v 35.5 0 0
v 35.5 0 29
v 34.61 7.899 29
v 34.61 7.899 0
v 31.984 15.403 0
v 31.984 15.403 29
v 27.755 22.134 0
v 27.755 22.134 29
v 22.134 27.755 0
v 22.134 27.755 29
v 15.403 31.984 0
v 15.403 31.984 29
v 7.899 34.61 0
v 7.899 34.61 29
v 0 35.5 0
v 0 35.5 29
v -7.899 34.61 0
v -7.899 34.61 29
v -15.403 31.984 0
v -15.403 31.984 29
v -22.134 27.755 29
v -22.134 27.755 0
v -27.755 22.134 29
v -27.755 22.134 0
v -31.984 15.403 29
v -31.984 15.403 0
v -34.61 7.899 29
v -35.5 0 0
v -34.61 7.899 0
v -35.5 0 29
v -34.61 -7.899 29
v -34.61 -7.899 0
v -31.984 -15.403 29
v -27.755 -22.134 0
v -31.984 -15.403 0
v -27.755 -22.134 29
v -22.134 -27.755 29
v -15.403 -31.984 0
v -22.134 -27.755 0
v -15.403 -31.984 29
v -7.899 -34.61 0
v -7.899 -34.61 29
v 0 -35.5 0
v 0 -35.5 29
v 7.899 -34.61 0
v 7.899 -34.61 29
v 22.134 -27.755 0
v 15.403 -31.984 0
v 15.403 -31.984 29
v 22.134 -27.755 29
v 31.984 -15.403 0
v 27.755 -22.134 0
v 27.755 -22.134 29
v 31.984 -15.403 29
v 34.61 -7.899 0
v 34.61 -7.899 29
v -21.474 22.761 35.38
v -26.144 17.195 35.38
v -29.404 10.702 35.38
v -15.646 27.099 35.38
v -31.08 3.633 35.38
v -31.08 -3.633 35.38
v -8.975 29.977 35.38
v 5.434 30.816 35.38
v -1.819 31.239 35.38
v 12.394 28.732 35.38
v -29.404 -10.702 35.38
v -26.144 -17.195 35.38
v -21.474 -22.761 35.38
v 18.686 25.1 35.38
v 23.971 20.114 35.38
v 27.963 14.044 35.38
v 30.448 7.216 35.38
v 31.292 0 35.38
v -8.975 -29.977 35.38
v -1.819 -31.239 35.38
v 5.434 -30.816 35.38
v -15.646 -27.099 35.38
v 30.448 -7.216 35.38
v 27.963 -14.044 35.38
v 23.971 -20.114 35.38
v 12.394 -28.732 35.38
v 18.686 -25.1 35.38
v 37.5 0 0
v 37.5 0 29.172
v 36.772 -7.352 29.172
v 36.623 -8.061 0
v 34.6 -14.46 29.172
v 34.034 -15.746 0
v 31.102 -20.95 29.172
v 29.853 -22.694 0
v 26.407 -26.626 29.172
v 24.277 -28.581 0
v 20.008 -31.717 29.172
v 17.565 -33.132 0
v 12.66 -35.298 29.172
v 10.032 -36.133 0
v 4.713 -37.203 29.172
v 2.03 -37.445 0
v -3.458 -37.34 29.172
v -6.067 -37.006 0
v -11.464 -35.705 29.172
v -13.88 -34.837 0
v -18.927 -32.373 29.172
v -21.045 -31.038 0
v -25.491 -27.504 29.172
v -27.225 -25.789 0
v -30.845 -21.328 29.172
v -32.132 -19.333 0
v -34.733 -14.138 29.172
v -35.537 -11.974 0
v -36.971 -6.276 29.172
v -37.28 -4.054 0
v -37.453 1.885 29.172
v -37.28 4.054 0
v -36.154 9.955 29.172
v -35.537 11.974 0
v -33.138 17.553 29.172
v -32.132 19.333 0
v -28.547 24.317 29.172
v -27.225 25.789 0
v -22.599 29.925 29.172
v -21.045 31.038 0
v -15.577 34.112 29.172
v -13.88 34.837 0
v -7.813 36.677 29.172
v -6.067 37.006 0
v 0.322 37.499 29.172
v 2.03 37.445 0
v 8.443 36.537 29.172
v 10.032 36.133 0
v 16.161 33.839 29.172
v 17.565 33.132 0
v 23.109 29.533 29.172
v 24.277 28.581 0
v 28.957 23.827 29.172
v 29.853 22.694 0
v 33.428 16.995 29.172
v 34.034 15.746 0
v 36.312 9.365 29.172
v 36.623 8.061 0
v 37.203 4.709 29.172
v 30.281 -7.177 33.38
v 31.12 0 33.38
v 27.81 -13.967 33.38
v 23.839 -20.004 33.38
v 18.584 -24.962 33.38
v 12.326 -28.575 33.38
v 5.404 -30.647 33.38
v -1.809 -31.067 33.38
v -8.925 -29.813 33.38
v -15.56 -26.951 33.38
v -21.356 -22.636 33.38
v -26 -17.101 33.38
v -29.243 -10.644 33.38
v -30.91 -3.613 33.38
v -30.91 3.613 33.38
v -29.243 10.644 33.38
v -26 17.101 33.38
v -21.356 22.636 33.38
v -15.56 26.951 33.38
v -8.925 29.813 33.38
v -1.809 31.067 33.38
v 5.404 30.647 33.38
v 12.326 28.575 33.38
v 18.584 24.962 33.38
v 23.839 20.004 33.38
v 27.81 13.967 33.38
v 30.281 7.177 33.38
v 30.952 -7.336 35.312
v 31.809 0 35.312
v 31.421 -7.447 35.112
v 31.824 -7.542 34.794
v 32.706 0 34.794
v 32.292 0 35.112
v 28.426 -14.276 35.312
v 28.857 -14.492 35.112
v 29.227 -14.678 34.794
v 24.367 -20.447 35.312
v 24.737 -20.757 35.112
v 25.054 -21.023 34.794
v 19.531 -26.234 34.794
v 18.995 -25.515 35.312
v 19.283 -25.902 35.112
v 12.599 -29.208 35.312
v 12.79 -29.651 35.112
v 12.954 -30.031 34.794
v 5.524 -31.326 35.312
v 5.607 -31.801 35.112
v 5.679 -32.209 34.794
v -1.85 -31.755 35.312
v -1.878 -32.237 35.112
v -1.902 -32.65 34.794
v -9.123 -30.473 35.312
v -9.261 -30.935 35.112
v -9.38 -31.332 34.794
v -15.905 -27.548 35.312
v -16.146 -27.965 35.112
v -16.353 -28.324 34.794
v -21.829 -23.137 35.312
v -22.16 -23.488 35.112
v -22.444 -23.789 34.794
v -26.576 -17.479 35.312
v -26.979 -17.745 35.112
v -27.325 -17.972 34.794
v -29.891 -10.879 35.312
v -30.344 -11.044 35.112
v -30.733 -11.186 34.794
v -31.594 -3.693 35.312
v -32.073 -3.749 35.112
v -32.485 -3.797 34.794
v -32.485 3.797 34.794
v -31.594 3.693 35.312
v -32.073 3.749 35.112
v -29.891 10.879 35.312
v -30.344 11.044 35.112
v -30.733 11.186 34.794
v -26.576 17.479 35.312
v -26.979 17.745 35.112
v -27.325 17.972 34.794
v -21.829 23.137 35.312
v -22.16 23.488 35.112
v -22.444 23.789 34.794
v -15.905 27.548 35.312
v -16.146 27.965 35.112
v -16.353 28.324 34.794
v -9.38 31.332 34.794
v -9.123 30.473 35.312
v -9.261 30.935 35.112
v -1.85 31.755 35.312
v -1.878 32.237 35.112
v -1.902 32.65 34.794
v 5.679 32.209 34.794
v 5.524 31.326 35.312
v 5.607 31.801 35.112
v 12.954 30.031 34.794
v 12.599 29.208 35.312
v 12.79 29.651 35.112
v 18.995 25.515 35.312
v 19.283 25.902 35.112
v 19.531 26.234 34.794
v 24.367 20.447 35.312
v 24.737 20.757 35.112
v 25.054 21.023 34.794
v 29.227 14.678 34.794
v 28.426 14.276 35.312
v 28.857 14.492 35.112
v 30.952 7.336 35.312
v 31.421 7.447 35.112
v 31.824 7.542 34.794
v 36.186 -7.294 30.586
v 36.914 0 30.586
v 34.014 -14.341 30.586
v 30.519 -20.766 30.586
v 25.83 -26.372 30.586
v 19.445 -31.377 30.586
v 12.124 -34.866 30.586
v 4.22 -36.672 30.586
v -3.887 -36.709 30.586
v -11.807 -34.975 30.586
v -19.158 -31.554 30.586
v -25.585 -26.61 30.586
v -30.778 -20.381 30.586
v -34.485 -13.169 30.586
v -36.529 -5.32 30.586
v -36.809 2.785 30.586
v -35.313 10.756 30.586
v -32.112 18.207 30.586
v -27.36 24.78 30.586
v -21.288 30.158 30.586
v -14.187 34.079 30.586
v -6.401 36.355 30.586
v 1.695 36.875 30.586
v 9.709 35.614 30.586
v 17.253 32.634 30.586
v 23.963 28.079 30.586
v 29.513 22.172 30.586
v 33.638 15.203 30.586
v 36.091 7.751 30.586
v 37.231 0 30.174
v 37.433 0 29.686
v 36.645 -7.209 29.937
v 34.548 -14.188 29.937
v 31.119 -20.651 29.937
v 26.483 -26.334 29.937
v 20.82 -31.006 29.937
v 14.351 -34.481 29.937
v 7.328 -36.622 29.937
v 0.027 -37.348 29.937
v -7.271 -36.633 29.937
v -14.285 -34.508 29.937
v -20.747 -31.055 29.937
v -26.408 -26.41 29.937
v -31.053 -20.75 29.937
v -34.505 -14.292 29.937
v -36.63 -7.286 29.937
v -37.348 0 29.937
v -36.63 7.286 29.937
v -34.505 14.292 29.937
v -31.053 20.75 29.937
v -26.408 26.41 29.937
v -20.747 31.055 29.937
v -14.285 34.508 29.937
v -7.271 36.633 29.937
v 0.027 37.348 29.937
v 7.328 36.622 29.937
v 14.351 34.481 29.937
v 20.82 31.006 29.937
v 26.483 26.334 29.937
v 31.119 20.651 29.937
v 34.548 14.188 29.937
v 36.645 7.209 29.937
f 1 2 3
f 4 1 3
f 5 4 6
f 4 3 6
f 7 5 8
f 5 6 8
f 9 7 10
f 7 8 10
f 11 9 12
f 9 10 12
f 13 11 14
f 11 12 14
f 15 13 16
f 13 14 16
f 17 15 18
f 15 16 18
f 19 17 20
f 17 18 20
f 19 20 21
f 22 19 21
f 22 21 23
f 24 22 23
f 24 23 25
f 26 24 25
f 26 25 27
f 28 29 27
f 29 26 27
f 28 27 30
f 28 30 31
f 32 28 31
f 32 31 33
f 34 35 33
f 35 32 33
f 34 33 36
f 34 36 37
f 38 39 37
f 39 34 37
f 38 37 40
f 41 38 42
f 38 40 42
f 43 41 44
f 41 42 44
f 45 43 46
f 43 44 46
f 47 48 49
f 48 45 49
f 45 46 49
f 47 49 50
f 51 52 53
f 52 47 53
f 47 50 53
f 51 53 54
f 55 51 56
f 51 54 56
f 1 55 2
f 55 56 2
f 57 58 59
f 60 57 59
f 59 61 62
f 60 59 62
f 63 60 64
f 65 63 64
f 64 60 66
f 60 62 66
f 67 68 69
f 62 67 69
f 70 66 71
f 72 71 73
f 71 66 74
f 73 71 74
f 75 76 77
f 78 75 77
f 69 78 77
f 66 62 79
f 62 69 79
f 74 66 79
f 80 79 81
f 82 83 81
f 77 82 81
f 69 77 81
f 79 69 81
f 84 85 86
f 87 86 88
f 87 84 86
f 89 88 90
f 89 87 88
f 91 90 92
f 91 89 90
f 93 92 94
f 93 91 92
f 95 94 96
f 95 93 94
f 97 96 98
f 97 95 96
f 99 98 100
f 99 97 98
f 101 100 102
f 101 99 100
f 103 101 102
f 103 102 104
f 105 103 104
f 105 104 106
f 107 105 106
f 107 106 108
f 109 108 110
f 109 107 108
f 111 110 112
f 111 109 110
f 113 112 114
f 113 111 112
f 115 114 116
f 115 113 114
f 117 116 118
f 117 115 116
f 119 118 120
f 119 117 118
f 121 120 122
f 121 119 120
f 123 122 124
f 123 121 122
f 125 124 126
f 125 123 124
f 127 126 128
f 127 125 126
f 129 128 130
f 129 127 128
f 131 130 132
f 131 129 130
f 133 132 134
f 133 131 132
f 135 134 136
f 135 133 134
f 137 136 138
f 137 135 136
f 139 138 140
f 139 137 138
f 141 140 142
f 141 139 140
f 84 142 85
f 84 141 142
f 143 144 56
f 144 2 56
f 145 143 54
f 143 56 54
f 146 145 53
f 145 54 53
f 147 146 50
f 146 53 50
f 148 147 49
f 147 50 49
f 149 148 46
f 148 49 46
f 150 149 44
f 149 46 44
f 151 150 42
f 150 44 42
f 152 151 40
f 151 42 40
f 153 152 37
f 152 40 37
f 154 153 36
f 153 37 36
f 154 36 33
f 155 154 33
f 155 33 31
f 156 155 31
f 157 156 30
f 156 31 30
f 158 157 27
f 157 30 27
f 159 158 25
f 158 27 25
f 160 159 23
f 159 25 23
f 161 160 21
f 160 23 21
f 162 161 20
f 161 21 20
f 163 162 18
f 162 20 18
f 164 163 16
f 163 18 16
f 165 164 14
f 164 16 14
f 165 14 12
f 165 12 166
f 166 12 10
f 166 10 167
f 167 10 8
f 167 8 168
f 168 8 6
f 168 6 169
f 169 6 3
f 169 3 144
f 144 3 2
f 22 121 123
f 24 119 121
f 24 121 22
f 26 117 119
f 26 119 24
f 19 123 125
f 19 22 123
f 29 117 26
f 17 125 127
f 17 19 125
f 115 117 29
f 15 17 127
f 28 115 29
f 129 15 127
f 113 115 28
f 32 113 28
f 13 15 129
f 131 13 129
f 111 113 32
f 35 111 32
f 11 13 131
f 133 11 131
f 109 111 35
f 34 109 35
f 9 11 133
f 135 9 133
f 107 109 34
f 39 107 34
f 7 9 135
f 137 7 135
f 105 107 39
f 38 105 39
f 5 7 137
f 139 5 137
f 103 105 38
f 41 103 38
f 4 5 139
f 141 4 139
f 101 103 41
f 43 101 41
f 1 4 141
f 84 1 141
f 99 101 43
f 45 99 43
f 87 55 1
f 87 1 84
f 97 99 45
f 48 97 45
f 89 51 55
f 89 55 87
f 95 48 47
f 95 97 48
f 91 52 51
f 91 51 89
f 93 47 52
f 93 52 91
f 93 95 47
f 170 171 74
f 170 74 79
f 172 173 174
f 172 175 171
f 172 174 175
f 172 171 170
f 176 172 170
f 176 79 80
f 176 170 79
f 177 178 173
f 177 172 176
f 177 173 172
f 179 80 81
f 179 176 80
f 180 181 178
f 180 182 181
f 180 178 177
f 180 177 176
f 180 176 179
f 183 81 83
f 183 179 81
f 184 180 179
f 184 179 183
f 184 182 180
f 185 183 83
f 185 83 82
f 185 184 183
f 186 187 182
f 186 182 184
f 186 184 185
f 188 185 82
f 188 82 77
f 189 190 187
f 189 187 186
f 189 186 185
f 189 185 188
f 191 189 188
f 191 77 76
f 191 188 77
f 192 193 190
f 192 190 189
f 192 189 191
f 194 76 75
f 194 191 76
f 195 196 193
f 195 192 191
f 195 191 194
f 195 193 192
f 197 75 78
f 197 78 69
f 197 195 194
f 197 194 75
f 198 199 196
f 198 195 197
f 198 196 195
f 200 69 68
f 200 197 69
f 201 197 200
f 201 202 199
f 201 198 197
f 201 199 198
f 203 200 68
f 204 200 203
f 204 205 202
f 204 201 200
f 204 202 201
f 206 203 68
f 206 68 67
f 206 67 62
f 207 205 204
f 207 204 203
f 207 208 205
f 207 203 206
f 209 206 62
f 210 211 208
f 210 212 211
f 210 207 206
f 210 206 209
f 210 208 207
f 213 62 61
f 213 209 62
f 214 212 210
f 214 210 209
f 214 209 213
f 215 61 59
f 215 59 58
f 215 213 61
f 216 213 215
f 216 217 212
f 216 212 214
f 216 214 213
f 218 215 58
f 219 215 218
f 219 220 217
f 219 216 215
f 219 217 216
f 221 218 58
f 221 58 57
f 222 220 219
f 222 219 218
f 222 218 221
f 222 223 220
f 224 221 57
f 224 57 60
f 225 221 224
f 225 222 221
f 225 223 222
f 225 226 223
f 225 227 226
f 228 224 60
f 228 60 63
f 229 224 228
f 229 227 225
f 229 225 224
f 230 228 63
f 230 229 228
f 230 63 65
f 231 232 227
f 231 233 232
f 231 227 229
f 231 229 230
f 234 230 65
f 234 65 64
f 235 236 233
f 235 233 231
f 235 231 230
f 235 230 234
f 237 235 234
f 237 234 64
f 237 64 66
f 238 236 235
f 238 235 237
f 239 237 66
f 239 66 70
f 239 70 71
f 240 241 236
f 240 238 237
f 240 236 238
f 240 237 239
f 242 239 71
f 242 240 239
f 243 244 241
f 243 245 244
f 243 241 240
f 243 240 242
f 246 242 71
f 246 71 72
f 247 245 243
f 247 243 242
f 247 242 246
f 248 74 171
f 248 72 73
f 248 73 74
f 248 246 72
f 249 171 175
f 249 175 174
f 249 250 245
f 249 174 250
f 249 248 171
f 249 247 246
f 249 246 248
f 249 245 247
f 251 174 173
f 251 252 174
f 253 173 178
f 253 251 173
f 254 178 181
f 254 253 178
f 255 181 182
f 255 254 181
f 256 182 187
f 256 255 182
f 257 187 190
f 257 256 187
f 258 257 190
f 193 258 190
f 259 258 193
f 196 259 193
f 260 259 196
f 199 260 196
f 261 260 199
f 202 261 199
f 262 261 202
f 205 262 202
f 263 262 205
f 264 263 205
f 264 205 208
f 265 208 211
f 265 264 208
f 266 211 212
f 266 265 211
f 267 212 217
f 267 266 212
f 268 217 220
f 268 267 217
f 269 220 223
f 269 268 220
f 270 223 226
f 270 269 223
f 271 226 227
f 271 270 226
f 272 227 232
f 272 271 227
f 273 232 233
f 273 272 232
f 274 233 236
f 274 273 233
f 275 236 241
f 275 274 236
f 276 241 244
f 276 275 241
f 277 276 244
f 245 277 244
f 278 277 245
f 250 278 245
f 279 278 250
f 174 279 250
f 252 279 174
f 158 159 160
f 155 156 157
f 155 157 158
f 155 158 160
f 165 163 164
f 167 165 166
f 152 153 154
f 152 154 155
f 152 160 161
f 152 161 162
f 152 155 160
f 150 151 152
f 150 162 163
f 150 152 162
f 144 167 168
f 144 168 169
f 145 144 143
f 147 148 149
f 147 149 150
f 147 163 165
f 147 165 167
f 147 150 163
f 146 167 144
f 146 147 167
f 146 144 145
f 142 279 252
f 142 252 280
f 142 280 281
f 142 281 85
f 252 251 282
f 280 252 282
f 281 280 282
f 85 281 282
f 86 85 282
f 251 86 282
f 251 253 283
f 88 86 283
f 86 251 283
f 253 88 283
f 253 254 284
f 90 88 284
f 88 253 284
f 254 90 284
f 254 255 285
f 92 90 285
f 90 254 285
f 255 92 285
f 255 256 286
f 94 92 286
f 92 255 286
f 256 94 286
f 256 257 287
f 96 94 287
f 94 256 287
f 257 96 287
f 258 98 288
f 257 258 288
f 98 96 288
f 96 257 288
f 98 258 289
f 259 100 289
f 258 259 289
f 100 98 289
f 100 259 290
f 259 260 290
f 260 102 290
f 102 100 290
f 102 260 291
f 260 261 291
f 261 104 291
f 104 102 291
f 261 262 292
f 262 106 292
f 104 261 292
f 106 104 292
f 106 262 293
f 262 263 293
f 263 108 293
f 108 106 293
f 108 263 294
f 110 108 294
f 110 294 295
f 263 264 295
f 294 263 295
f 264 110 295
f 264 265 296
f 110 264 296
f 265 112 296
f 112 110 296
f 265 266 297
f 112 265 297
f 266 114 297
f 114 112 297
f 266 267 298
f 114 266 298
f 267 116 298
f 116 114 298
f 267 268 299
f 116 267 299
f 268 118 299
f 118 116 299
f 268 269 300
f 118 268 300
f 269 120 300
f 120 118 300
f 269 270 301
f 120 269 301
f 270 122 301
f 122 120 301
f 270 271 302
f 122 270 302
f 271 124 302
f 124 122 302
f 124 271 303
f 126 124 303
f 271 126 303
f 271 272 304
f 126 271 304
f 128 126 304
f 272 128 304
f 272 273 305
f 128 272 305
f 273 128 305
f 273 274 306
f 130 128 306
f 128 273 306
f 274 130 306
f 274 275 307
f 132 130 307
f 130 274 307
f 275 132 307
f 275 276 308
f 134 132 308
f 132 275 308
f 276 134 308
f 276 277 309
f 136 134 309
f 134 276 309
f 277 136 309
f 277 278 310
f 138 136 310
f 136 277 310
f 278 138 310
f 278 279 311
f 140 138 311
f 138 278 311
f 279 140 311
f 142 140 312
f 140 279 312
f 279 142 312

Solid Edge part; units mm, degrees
sketch "Sketch1" plane through (0, 0, 0) normal (0, -1, 0) x (1, 0, 0)
  line L0 (37.5, 0) -> (35.5, 0)
  line L1 (35.5, 0) -> (35.5, 29)
  line L2 (35.5, 29) -> (31.12, 33.38)
  line L3 (31.12, 33.38) -> (0, 33.38)
  line L4 (0, 33.38) -> (0, 35.38)
  line L5 (0, 35.38) -> (32.12, 35.38)
  line L6 (32.12, 35.38) -> (37.5, 30)
  line L7 (37.5, 30) -> (37.5, 0)
  dimension "D1" = 37.5
  dimension "D2" = 30
  dimension "D3" = 2
  dimension "D4" = 1
revolve "RevolvedProtrusion1" add sketch "Sketch1" angle 360 about axis through (0, 0, 3.61) along (0, 0, -1)
fillet "Verrundung_1" radius 2 2 edges at (-32.12, 0, 35.38) (-37.5, 0, 30)
properties material "ABS-Plastik, mittlerer Anschlag"
